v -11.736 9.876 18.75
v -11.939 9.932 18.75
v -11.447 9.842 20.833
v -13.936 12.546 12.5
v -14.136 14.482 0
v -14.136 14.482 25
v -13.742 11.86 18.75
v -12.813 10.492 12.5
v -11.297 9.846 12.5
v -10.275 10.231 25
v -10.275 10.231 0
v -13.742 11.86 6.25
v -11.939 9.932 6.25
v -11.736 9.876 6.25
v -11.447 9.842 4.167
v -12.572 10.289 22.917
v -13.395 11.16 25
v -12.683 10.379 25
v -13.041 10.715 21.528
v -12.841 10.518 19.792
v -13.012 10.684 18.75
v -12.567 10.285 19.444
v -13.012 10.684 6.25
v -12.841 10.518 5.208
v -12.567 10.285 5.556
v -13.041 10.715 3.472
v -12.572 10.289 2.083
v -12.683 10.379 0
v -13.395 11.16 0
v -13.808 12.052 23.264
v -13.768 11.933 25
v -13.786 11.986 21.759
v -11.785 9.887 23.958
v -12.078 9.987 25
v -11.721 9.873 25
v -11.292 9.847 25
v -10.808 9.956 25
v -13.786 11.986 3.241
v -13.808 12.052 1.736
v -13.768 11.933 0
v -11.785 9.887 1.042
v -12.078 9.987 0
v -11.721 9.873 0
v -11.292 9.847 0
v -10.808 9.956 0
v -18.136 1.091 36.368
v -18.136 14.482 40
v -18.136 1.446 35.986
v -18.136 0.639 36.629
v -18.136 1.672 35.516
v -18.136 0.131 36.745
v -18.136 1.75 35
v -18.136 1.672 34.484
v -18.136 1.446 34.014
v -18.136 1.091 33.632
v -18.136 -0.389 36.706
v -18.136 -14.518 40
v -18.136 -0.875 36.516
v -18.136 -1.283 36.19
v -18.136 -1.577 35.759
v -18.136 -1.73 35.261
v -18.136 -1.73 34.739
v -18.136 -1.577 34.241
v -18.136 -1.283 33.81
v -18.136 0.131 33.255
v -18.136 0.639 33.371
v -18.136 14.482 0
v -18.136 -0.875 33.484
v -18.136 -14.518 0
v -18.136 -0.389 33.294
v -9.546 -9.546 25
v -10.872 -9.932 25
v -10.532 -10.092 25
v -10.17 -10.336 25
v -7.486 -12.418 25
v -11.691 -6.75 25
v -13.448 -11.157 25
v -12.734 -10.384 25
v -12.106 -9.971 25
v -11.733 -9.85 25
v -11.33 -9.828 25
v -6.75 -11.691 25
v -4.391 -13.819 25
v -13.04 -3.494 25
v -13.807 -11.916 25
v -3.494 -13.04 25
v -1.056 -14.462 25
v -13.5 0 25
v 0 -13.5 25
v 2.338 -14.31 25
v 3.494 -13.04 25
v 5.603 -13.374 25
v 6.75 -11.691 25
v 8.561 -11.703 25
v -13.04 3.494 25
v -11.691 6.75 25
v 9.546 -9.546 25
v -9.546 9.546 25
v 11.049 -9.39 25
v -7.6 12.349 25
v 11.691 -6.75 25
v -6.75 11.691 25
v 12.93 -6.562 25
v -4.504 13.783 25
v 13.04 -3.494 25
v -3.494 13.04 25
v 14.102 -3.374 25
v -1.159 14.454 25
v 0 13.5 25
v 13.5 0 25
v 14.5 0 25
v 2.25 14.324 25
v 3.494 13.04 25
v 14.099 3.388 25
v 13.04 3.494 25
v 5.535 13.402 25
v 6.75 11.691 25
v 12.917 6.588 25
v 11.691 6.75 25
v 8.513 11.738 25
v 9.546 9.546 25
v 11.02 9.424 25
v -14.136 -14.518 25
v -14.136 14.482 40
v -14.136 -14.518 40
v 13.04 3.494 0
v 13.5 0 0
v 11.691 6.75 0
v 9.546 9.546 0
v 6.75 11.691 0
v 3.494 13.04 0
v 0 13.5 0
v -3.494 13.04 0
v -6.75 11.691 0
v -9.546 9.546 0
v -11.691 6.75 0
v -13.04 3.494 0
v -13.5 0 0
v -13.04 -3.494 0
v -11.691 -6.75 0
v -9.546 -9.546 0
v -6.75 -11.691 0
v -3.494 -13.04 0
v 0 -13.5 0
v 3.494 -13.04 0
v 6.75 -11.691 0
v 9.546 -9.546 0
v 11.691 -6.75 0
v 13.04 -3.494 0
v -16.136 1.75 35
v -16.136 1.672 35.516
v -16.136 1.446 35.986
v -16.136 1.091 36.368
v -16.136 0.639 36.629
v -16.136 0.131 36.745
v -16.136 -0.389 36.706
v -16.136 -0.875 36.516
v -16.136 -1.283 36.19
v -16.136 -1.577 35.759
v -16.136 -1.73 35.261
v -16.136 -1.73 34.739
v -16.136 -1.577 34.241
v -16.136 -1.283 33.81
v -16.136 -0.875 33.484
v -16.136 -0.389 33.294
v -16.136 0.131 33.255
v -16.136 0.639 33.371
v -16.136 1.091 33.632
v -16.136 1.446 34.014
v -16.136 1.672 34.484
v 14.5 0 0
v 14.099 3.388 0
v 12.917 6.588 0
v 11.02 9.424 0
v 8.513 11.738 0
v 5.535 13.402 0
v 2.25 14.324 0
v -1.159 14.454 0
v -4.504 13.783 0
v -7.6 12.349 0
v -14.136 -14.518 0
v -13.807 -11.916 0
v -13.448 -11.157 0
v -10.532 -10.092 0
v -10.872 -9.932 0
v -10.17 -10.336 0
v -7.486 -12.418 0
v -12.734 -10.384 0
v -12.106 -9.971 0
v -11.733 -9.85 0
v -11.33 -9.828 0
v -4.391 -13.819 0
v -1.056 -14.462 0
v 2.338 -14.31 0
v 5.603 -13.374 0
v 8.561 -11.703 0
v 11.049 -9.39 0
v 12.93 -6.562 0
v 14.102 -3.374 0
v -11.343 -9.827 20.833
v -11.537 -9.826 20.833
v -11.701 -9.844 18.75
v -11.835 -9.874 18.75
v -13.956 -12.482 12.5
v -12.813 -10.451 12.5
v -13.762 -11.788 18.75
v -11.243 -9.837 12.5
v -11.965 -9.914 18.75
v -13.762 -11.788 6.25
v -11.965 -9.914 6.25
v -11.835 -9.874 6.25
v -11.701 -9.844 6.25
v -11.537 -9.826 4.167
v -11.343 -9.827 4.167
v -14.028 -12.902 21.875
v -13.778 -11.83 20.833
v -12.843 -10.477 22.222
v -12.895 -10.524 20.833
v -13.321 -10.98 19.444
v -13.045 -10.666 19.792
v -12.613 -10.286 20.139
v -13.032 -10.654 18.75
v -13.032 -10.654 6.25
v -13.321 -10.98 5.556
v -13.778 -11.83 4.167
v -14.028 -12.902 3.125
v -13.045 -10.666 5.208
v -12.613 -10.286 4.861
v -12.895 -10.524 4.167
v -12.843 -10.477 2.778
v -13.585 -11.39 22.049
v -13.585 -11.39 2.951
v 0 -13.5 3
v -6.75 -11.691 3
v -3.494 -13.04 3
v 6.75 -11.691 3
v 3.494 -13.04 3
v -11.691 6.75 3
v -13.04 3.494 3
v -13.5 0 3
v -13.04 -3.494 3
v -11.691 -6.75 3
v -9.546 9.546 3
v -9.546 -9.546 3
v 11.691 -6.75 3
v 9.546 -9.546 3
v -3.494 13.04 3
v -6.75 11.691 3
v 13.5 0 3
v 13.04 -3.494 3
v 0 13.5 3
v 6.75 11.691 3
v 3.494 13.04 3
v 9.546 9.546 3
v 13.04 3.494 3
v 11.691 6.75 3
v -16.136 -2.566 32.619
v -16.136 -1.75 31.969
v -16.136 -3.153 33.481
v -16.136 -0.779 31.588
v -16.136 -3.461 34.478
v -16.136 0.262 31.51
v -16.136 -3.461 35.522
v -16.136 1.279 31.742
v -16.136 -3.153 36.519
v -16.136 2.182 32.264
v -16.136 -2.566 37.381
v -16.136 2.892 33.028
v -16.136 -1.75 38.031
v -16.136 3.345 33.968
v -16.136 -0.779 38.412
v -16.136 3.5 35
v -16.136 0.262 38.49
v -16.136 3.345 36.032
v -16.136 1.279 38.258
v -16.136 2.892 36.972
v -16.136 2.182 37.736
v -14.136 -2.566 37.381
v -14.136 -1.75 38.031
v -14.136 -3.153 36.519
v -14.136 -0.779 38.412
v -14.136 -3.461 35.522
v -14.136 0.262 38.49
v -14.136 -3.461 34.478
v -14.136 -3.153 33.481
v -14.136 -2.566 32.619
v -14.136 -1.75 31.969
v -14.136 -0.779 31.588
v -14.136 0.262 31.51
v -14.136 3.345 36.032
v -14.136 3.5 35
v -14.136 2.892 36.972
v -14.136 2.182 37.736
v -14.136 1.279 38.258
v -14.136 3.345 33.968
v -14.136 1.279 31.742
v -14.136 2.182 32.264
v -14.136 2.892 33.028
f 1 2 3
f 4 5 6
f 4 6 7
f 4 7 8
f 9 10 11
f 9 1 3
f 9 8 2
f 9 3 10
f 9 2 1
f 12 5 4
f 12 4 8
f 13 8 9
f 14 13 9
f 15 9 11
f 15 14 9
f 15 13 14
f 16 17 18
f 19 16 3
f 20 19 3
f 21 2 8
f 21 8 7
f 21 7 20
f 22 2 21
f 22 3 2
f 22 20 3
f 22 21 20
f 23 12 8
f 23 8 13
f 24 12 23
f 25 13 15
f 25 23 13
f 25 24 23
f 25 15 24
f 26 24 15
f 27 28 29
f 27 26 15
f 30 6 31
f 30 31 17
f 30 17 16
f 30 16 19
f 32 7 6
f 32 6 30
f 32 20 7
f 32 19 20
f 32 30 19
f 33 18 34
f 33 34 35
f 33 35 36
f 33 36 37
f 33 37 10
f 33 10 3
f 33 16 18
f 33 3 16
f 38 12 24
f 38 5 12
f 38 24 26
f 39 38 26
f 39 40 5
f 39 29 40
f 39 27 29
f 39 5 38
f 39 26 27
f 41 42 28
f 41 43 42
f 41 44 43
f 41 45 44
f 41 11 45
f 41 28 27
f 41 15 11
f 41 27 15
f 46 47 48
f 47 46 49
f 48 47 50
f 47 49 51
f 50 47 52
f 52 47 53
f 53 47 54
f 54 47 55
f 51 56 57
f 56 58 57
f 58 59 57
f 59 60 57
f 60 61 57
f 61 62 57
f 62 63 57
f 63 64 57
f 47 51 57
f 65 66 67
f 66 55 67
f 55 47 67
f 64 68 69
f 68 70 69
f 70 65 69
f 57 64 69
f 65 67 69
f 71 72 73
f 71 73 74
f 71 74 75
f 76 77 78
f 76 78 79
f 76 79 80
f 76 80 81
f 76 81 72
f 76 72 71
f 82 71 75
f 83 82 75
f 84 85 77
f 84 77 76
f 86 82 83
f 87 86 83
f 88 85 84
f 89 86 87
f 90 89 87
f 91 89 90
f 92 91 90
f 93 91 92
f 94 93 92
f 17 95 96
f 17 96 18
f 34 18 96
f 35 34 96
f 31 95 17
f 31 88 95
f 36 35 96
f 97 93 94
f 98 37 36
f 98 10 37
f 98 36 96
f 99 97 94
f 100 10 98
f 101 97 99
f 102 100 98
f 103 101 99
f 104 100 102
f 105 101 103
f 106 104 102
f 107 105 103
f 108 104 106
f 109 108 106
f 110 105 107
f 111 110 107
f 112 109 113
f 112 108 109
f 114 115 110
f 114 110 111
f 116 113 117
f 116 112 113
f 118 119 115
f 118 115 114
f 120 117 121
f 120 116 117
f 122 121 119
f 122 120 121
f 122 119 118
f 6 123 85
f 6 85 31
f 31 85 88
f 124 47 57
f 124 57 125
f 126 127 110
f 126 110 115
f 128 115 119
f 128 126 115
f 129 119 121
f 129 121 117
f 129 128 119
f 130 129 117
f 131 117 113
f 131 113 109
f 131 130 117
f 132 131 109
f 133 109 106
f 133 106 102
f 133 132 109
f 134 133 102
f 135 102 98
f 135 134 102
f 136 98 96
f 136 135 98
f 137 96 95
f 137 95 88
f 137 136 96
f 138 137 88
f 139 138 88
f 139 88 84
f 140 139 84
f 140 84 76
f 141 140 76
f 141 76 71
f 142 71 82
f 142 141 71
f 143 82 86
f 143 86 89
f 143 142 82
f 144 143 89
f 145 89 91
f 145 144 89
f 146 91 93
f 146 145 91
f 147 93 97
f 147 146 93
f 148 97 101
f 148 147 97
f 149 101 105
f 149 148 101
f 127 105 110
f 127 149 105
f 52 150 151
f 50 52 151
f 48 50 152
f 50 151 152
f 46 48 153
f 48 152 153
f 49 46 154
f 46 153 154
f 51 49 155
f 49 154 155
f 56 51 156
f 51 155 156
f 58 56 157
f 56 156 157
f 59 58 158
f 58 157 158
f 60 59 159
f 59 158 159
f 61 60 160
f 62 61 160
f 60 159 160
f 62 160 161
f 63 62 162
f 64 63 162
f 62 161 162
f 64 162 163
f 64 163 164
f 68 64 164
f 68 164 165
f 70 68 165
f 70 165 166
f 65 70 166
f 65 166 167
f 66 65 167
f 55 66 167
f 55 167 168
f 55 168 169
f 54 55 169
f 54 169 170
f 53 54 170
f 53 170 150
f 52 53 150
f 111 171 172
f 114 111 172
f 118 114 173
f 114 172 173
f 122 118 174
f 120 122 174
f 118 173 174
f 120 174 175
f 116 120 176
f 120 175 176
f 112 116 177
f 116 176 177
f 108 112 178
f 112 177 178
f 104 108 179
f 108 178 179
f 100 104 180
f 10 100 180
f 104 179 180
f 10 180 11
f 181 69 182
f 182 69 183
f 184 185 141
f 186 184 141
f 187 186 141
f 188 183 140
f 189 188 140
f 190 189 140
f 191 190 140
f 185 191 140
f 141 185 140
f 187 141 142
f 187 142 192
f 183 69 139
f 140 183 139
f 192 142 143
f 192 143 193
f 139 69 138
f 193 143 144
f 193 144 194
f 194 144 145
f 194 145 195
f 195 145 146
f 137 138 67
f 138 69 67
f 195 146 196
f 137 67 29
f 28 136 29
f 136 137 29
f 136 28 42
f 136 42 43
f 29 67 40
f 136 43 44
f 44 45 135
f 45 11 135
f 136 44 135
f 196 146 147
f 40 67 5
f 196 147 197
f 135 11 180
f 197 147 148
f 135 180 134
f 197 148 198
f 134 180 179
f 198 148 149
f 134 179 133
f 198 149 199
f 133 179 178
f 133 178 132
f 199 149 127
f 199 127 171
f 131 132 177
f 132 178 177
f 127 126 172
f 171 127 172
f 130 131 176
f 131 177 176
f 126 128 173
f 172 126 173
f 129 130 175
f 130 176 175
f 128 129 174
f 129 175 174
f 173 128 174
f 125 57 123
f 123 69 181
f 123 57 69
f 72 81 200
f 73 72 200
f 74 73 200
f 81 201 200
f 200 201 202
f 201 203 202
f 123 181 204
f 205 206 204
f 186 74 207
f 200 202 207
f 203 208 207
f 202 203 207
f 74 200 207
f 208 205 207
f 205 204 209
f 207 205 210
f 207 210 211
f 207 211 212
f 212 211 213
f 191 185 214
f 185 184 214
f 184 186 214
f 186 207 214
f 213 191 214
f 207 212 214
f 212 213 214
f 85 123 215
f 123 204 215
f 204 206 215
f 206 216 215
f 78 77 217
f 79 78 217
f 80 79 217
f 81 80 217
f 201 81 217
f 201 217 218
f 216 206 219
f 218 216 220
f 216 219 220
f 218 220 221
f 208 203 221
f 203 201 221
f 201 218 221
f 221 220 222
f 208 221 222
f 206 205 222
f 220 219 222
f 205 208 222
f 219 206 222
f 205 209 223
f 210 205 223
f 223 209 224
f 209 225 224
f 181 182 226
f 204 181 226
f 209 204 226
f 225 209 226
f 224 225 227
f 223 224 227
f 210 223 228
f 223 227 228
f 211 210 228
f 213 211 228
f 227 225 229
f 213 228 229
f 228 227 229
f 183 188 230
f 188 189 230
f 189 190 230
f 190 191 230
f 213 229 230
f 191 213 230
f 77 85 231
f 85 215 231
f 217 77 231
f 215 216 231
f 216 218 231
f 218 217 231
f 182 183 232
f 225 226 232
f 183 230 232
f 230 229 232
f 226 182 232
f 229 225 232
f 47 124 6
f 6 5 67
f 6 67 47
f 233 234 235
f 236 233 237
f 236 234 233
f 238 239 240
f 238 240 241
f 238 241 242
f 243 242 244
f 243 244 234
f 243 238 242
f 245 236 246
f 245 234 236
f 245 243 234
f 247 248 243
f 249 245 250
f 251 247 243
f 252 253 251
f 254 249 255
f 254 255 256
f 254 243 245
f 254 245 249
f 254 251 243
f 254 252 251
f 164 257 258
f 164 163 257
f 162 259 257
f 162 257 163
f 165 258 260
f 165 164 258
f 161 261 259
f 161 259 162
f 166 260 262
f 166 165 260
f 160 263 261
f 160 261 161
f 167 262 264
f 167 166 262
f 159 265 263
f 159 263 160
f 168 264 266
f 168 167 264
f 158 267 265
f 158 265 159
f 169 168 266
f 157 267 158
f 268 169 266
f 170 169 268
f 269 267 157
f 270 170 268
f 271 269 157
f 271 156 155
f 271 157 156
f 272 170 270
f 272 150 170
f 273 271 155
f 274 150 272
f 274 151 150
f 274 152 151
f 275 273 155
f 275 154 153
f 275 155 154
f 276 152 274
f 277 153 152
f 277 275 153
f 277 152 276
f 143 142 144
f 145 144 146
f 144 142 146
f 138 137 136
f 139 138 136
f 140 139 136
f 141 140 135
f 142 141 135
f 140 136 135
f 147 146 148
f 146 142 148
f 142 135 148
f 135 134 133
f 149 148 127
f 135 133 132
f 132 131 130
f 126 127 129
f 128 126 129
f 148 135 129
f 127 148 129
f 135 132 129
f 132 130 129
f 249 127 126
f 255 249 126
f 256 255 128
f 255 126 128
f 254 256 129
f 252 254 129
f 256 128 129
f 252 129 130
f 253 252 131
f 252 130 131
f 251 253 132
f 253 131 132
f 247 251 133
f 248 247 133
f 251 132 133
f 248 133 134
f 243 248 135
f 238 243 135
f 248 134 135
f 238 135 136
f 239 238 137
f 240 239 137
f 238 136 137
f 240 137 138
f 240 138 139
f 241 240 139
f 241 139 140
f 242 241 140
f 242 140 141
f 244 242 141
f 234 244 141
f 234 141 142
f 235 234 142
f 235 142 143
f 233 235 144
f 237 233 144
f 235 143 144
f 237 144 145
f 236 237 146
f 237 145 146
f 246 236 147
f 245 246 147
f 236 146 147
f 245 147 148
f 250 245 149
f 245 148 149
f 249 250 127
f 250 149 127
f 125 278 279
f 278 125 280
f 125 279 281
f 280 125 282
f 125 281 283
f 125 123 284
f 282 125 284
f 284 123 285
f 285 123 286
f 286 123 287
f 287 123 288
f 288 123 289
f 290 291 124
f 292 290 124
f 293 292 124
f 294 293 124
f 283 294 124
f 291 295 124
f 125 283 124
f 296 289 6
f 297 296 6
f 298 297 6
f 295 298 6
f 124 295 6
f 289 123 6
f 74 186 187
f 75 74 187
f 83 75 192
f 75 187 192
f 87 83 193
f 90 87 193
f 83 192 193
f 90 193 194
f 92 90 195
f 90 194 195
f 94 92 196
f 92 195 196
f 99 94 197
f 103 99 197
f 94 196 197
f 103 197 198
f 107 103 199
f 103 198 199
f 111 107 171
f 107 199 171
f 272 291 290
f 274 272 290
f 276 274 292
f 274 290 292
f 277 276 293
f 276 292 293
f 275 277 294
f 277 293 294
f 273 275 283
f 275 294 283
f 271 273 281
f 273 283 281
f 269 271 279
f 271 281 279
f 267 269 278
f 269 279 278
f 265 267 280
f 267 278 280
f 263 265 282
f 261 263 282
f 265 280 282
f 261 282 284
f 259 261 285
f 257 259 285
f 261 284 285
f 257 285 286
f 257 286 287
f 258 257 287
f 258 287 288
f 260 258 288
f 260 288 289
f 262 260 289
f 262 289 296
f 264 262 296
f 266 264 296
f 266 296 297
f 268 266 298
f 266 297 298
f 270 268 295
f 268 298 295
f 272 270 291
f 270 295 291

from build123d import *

# Parameters (mm, degrees)
F1_DEPTH = 40
F0_R     = 13.5
F2_DEPTH = 3
F3_DEPTH = 25
F4_R     = 1.75
F5_DEPTH = 25
F4_R_2   = 3.5
F6_DEPTH = 2


with BuildPart() as f1:
    # F0 (on Top) → F1 (new body)
    with BuildSketch(Plane.XY):
        with BuildLine():
            Line((-14.1355262175, -3.2306189119), (-14.1355262175, 3.2306189119))
            ThreePointArc((-14.1355262175, 3.2306189119), (-14.5, 0), (-14.1355262175, -3.2306189119))
        make_face()
        with BuildLine():
            ThreePointArc((-14.1355262175, -3.2306189119), (-14.5, 0), (-14.1355262175, 3.2306189119))
            Line((-14.1355262175, 3.2306189119), (-14.1355262175, 14.4821423069))
            Line((-14.1355262175, 14.4821423069), (-18.1355262175, 14.4821423069))
            Line((-18.1355262175, 14.4821423069), (-18.1355262175, -14.5178576931))
            Line((-18.1355262175, -14.5178576931), (-14.1355262175, -14.5178576931))
            Line((-14.1355262175, -14.5178576931), (-14.1355262175, -3.2306189119))
        make_face()
    extrude(amount=F1_DEPTH)

    # F0 (on Top) → F3 (join)
    with BuildSketch(Plane.XY):
        with BuildLine():
            ThreePointArc((-14.1355262175, 3.2306189119), (-12.6971385159, 7.0023334331), (-10.2746975407, 10.2313533048))
            add(Edge.make_bspline(
                [(-14.1355262175, 14.4821423069), (-14.0662710763, 12.0975714625), (-13.2319243302, 10.509407647), (-11.3992663412, 9.490766824), (-10.2746975407, 10.2313533048)],
                knots=[0, 0, 0, 0, 0.5620764572, 1, 1, 1, 1], degree=3))
            Line((-14.1355262175, 14.4821423069), (-14.1355262175, 3.2306189119))
        make_face()
        with BuildLine():
            ThreePointArc((-10.1697726735, -10.3356530403), (5.6030481095, -13.3737000072), (14.5, 0))
            ThreePointArc((14.5, 0), (5.5347486691, 13.402110176), (-10.2746975407, 10.2313533048))
            ThreePointArc((-10.2746975407, 10.2313533048), (-12.6971385159, 7.0023334331), (-14.1355262175, 3.2306189119))
            Line((-14.1355262175, 3.2306189119), (-14.1355262175, -3.2306189119))
            ThreePointArc((-14.1355262175, -3.2306189119), (-12.6612505716, -7.0670173314), (-10.1697726735, -10.3356530403))
        make_face()
        Circle(F0_R, mode=Mode.SUBTRACT)
        with BuildLine():
            add(Edge.make_bspline(
                [(-14.1355262175, -14.5178576931), (-14.1023624483, -11.961212262), (-13.2307772223, -10.5113467824), (-11.3579562474, -9.4215989986), (-10.1697726735, -10.3356530403)],
                knots=[0, 0, 0, 0, 0.5597409936, 1, 1, 1, 1], degree=3))
            ThreePointArc((-10.1697726735, -10.3356530403), (-12.6612505716, -7.0670173314), (-14.1355262175, -3.2306189119))
            Line((-14.1355262175, -3.2306189119), (-14.1355262175, -14.5178576931))
        make_face()
    extrude(amount=F3_DEPTH)

    # F4 (on face) → F5 (cut)
    with BuildSketch(Plane.YZ.offset(-14.1355262175)):
        with Locations((0, 35)):
            Circle(F4_R)
    extrude(amount=-F5_DEPTH, mode=Mode.SUBTRACT)

    # F4 (on face) → F6 (cut)
    with BuildSketch(Plane.YZ.offset(-14.1355262175)):
        with Locations((0, 35)):
            Circle(F4_R_2)
        with Locations((0, 35)):
            Circle(F4_R, mode=Mode.SUBTRACT)
    extrude(amount=-F6_DEPTH, mode=Mode.SUBTRACT)


with BuildPart() as f2:
    # F0 (on Top) → F2 (new body)
    with BuildSketch(Plane.XY):
        Circle(F0_R)
    extrude(amount=F2_DEPTH)


solid = Compound([f1.part, f2.part])
